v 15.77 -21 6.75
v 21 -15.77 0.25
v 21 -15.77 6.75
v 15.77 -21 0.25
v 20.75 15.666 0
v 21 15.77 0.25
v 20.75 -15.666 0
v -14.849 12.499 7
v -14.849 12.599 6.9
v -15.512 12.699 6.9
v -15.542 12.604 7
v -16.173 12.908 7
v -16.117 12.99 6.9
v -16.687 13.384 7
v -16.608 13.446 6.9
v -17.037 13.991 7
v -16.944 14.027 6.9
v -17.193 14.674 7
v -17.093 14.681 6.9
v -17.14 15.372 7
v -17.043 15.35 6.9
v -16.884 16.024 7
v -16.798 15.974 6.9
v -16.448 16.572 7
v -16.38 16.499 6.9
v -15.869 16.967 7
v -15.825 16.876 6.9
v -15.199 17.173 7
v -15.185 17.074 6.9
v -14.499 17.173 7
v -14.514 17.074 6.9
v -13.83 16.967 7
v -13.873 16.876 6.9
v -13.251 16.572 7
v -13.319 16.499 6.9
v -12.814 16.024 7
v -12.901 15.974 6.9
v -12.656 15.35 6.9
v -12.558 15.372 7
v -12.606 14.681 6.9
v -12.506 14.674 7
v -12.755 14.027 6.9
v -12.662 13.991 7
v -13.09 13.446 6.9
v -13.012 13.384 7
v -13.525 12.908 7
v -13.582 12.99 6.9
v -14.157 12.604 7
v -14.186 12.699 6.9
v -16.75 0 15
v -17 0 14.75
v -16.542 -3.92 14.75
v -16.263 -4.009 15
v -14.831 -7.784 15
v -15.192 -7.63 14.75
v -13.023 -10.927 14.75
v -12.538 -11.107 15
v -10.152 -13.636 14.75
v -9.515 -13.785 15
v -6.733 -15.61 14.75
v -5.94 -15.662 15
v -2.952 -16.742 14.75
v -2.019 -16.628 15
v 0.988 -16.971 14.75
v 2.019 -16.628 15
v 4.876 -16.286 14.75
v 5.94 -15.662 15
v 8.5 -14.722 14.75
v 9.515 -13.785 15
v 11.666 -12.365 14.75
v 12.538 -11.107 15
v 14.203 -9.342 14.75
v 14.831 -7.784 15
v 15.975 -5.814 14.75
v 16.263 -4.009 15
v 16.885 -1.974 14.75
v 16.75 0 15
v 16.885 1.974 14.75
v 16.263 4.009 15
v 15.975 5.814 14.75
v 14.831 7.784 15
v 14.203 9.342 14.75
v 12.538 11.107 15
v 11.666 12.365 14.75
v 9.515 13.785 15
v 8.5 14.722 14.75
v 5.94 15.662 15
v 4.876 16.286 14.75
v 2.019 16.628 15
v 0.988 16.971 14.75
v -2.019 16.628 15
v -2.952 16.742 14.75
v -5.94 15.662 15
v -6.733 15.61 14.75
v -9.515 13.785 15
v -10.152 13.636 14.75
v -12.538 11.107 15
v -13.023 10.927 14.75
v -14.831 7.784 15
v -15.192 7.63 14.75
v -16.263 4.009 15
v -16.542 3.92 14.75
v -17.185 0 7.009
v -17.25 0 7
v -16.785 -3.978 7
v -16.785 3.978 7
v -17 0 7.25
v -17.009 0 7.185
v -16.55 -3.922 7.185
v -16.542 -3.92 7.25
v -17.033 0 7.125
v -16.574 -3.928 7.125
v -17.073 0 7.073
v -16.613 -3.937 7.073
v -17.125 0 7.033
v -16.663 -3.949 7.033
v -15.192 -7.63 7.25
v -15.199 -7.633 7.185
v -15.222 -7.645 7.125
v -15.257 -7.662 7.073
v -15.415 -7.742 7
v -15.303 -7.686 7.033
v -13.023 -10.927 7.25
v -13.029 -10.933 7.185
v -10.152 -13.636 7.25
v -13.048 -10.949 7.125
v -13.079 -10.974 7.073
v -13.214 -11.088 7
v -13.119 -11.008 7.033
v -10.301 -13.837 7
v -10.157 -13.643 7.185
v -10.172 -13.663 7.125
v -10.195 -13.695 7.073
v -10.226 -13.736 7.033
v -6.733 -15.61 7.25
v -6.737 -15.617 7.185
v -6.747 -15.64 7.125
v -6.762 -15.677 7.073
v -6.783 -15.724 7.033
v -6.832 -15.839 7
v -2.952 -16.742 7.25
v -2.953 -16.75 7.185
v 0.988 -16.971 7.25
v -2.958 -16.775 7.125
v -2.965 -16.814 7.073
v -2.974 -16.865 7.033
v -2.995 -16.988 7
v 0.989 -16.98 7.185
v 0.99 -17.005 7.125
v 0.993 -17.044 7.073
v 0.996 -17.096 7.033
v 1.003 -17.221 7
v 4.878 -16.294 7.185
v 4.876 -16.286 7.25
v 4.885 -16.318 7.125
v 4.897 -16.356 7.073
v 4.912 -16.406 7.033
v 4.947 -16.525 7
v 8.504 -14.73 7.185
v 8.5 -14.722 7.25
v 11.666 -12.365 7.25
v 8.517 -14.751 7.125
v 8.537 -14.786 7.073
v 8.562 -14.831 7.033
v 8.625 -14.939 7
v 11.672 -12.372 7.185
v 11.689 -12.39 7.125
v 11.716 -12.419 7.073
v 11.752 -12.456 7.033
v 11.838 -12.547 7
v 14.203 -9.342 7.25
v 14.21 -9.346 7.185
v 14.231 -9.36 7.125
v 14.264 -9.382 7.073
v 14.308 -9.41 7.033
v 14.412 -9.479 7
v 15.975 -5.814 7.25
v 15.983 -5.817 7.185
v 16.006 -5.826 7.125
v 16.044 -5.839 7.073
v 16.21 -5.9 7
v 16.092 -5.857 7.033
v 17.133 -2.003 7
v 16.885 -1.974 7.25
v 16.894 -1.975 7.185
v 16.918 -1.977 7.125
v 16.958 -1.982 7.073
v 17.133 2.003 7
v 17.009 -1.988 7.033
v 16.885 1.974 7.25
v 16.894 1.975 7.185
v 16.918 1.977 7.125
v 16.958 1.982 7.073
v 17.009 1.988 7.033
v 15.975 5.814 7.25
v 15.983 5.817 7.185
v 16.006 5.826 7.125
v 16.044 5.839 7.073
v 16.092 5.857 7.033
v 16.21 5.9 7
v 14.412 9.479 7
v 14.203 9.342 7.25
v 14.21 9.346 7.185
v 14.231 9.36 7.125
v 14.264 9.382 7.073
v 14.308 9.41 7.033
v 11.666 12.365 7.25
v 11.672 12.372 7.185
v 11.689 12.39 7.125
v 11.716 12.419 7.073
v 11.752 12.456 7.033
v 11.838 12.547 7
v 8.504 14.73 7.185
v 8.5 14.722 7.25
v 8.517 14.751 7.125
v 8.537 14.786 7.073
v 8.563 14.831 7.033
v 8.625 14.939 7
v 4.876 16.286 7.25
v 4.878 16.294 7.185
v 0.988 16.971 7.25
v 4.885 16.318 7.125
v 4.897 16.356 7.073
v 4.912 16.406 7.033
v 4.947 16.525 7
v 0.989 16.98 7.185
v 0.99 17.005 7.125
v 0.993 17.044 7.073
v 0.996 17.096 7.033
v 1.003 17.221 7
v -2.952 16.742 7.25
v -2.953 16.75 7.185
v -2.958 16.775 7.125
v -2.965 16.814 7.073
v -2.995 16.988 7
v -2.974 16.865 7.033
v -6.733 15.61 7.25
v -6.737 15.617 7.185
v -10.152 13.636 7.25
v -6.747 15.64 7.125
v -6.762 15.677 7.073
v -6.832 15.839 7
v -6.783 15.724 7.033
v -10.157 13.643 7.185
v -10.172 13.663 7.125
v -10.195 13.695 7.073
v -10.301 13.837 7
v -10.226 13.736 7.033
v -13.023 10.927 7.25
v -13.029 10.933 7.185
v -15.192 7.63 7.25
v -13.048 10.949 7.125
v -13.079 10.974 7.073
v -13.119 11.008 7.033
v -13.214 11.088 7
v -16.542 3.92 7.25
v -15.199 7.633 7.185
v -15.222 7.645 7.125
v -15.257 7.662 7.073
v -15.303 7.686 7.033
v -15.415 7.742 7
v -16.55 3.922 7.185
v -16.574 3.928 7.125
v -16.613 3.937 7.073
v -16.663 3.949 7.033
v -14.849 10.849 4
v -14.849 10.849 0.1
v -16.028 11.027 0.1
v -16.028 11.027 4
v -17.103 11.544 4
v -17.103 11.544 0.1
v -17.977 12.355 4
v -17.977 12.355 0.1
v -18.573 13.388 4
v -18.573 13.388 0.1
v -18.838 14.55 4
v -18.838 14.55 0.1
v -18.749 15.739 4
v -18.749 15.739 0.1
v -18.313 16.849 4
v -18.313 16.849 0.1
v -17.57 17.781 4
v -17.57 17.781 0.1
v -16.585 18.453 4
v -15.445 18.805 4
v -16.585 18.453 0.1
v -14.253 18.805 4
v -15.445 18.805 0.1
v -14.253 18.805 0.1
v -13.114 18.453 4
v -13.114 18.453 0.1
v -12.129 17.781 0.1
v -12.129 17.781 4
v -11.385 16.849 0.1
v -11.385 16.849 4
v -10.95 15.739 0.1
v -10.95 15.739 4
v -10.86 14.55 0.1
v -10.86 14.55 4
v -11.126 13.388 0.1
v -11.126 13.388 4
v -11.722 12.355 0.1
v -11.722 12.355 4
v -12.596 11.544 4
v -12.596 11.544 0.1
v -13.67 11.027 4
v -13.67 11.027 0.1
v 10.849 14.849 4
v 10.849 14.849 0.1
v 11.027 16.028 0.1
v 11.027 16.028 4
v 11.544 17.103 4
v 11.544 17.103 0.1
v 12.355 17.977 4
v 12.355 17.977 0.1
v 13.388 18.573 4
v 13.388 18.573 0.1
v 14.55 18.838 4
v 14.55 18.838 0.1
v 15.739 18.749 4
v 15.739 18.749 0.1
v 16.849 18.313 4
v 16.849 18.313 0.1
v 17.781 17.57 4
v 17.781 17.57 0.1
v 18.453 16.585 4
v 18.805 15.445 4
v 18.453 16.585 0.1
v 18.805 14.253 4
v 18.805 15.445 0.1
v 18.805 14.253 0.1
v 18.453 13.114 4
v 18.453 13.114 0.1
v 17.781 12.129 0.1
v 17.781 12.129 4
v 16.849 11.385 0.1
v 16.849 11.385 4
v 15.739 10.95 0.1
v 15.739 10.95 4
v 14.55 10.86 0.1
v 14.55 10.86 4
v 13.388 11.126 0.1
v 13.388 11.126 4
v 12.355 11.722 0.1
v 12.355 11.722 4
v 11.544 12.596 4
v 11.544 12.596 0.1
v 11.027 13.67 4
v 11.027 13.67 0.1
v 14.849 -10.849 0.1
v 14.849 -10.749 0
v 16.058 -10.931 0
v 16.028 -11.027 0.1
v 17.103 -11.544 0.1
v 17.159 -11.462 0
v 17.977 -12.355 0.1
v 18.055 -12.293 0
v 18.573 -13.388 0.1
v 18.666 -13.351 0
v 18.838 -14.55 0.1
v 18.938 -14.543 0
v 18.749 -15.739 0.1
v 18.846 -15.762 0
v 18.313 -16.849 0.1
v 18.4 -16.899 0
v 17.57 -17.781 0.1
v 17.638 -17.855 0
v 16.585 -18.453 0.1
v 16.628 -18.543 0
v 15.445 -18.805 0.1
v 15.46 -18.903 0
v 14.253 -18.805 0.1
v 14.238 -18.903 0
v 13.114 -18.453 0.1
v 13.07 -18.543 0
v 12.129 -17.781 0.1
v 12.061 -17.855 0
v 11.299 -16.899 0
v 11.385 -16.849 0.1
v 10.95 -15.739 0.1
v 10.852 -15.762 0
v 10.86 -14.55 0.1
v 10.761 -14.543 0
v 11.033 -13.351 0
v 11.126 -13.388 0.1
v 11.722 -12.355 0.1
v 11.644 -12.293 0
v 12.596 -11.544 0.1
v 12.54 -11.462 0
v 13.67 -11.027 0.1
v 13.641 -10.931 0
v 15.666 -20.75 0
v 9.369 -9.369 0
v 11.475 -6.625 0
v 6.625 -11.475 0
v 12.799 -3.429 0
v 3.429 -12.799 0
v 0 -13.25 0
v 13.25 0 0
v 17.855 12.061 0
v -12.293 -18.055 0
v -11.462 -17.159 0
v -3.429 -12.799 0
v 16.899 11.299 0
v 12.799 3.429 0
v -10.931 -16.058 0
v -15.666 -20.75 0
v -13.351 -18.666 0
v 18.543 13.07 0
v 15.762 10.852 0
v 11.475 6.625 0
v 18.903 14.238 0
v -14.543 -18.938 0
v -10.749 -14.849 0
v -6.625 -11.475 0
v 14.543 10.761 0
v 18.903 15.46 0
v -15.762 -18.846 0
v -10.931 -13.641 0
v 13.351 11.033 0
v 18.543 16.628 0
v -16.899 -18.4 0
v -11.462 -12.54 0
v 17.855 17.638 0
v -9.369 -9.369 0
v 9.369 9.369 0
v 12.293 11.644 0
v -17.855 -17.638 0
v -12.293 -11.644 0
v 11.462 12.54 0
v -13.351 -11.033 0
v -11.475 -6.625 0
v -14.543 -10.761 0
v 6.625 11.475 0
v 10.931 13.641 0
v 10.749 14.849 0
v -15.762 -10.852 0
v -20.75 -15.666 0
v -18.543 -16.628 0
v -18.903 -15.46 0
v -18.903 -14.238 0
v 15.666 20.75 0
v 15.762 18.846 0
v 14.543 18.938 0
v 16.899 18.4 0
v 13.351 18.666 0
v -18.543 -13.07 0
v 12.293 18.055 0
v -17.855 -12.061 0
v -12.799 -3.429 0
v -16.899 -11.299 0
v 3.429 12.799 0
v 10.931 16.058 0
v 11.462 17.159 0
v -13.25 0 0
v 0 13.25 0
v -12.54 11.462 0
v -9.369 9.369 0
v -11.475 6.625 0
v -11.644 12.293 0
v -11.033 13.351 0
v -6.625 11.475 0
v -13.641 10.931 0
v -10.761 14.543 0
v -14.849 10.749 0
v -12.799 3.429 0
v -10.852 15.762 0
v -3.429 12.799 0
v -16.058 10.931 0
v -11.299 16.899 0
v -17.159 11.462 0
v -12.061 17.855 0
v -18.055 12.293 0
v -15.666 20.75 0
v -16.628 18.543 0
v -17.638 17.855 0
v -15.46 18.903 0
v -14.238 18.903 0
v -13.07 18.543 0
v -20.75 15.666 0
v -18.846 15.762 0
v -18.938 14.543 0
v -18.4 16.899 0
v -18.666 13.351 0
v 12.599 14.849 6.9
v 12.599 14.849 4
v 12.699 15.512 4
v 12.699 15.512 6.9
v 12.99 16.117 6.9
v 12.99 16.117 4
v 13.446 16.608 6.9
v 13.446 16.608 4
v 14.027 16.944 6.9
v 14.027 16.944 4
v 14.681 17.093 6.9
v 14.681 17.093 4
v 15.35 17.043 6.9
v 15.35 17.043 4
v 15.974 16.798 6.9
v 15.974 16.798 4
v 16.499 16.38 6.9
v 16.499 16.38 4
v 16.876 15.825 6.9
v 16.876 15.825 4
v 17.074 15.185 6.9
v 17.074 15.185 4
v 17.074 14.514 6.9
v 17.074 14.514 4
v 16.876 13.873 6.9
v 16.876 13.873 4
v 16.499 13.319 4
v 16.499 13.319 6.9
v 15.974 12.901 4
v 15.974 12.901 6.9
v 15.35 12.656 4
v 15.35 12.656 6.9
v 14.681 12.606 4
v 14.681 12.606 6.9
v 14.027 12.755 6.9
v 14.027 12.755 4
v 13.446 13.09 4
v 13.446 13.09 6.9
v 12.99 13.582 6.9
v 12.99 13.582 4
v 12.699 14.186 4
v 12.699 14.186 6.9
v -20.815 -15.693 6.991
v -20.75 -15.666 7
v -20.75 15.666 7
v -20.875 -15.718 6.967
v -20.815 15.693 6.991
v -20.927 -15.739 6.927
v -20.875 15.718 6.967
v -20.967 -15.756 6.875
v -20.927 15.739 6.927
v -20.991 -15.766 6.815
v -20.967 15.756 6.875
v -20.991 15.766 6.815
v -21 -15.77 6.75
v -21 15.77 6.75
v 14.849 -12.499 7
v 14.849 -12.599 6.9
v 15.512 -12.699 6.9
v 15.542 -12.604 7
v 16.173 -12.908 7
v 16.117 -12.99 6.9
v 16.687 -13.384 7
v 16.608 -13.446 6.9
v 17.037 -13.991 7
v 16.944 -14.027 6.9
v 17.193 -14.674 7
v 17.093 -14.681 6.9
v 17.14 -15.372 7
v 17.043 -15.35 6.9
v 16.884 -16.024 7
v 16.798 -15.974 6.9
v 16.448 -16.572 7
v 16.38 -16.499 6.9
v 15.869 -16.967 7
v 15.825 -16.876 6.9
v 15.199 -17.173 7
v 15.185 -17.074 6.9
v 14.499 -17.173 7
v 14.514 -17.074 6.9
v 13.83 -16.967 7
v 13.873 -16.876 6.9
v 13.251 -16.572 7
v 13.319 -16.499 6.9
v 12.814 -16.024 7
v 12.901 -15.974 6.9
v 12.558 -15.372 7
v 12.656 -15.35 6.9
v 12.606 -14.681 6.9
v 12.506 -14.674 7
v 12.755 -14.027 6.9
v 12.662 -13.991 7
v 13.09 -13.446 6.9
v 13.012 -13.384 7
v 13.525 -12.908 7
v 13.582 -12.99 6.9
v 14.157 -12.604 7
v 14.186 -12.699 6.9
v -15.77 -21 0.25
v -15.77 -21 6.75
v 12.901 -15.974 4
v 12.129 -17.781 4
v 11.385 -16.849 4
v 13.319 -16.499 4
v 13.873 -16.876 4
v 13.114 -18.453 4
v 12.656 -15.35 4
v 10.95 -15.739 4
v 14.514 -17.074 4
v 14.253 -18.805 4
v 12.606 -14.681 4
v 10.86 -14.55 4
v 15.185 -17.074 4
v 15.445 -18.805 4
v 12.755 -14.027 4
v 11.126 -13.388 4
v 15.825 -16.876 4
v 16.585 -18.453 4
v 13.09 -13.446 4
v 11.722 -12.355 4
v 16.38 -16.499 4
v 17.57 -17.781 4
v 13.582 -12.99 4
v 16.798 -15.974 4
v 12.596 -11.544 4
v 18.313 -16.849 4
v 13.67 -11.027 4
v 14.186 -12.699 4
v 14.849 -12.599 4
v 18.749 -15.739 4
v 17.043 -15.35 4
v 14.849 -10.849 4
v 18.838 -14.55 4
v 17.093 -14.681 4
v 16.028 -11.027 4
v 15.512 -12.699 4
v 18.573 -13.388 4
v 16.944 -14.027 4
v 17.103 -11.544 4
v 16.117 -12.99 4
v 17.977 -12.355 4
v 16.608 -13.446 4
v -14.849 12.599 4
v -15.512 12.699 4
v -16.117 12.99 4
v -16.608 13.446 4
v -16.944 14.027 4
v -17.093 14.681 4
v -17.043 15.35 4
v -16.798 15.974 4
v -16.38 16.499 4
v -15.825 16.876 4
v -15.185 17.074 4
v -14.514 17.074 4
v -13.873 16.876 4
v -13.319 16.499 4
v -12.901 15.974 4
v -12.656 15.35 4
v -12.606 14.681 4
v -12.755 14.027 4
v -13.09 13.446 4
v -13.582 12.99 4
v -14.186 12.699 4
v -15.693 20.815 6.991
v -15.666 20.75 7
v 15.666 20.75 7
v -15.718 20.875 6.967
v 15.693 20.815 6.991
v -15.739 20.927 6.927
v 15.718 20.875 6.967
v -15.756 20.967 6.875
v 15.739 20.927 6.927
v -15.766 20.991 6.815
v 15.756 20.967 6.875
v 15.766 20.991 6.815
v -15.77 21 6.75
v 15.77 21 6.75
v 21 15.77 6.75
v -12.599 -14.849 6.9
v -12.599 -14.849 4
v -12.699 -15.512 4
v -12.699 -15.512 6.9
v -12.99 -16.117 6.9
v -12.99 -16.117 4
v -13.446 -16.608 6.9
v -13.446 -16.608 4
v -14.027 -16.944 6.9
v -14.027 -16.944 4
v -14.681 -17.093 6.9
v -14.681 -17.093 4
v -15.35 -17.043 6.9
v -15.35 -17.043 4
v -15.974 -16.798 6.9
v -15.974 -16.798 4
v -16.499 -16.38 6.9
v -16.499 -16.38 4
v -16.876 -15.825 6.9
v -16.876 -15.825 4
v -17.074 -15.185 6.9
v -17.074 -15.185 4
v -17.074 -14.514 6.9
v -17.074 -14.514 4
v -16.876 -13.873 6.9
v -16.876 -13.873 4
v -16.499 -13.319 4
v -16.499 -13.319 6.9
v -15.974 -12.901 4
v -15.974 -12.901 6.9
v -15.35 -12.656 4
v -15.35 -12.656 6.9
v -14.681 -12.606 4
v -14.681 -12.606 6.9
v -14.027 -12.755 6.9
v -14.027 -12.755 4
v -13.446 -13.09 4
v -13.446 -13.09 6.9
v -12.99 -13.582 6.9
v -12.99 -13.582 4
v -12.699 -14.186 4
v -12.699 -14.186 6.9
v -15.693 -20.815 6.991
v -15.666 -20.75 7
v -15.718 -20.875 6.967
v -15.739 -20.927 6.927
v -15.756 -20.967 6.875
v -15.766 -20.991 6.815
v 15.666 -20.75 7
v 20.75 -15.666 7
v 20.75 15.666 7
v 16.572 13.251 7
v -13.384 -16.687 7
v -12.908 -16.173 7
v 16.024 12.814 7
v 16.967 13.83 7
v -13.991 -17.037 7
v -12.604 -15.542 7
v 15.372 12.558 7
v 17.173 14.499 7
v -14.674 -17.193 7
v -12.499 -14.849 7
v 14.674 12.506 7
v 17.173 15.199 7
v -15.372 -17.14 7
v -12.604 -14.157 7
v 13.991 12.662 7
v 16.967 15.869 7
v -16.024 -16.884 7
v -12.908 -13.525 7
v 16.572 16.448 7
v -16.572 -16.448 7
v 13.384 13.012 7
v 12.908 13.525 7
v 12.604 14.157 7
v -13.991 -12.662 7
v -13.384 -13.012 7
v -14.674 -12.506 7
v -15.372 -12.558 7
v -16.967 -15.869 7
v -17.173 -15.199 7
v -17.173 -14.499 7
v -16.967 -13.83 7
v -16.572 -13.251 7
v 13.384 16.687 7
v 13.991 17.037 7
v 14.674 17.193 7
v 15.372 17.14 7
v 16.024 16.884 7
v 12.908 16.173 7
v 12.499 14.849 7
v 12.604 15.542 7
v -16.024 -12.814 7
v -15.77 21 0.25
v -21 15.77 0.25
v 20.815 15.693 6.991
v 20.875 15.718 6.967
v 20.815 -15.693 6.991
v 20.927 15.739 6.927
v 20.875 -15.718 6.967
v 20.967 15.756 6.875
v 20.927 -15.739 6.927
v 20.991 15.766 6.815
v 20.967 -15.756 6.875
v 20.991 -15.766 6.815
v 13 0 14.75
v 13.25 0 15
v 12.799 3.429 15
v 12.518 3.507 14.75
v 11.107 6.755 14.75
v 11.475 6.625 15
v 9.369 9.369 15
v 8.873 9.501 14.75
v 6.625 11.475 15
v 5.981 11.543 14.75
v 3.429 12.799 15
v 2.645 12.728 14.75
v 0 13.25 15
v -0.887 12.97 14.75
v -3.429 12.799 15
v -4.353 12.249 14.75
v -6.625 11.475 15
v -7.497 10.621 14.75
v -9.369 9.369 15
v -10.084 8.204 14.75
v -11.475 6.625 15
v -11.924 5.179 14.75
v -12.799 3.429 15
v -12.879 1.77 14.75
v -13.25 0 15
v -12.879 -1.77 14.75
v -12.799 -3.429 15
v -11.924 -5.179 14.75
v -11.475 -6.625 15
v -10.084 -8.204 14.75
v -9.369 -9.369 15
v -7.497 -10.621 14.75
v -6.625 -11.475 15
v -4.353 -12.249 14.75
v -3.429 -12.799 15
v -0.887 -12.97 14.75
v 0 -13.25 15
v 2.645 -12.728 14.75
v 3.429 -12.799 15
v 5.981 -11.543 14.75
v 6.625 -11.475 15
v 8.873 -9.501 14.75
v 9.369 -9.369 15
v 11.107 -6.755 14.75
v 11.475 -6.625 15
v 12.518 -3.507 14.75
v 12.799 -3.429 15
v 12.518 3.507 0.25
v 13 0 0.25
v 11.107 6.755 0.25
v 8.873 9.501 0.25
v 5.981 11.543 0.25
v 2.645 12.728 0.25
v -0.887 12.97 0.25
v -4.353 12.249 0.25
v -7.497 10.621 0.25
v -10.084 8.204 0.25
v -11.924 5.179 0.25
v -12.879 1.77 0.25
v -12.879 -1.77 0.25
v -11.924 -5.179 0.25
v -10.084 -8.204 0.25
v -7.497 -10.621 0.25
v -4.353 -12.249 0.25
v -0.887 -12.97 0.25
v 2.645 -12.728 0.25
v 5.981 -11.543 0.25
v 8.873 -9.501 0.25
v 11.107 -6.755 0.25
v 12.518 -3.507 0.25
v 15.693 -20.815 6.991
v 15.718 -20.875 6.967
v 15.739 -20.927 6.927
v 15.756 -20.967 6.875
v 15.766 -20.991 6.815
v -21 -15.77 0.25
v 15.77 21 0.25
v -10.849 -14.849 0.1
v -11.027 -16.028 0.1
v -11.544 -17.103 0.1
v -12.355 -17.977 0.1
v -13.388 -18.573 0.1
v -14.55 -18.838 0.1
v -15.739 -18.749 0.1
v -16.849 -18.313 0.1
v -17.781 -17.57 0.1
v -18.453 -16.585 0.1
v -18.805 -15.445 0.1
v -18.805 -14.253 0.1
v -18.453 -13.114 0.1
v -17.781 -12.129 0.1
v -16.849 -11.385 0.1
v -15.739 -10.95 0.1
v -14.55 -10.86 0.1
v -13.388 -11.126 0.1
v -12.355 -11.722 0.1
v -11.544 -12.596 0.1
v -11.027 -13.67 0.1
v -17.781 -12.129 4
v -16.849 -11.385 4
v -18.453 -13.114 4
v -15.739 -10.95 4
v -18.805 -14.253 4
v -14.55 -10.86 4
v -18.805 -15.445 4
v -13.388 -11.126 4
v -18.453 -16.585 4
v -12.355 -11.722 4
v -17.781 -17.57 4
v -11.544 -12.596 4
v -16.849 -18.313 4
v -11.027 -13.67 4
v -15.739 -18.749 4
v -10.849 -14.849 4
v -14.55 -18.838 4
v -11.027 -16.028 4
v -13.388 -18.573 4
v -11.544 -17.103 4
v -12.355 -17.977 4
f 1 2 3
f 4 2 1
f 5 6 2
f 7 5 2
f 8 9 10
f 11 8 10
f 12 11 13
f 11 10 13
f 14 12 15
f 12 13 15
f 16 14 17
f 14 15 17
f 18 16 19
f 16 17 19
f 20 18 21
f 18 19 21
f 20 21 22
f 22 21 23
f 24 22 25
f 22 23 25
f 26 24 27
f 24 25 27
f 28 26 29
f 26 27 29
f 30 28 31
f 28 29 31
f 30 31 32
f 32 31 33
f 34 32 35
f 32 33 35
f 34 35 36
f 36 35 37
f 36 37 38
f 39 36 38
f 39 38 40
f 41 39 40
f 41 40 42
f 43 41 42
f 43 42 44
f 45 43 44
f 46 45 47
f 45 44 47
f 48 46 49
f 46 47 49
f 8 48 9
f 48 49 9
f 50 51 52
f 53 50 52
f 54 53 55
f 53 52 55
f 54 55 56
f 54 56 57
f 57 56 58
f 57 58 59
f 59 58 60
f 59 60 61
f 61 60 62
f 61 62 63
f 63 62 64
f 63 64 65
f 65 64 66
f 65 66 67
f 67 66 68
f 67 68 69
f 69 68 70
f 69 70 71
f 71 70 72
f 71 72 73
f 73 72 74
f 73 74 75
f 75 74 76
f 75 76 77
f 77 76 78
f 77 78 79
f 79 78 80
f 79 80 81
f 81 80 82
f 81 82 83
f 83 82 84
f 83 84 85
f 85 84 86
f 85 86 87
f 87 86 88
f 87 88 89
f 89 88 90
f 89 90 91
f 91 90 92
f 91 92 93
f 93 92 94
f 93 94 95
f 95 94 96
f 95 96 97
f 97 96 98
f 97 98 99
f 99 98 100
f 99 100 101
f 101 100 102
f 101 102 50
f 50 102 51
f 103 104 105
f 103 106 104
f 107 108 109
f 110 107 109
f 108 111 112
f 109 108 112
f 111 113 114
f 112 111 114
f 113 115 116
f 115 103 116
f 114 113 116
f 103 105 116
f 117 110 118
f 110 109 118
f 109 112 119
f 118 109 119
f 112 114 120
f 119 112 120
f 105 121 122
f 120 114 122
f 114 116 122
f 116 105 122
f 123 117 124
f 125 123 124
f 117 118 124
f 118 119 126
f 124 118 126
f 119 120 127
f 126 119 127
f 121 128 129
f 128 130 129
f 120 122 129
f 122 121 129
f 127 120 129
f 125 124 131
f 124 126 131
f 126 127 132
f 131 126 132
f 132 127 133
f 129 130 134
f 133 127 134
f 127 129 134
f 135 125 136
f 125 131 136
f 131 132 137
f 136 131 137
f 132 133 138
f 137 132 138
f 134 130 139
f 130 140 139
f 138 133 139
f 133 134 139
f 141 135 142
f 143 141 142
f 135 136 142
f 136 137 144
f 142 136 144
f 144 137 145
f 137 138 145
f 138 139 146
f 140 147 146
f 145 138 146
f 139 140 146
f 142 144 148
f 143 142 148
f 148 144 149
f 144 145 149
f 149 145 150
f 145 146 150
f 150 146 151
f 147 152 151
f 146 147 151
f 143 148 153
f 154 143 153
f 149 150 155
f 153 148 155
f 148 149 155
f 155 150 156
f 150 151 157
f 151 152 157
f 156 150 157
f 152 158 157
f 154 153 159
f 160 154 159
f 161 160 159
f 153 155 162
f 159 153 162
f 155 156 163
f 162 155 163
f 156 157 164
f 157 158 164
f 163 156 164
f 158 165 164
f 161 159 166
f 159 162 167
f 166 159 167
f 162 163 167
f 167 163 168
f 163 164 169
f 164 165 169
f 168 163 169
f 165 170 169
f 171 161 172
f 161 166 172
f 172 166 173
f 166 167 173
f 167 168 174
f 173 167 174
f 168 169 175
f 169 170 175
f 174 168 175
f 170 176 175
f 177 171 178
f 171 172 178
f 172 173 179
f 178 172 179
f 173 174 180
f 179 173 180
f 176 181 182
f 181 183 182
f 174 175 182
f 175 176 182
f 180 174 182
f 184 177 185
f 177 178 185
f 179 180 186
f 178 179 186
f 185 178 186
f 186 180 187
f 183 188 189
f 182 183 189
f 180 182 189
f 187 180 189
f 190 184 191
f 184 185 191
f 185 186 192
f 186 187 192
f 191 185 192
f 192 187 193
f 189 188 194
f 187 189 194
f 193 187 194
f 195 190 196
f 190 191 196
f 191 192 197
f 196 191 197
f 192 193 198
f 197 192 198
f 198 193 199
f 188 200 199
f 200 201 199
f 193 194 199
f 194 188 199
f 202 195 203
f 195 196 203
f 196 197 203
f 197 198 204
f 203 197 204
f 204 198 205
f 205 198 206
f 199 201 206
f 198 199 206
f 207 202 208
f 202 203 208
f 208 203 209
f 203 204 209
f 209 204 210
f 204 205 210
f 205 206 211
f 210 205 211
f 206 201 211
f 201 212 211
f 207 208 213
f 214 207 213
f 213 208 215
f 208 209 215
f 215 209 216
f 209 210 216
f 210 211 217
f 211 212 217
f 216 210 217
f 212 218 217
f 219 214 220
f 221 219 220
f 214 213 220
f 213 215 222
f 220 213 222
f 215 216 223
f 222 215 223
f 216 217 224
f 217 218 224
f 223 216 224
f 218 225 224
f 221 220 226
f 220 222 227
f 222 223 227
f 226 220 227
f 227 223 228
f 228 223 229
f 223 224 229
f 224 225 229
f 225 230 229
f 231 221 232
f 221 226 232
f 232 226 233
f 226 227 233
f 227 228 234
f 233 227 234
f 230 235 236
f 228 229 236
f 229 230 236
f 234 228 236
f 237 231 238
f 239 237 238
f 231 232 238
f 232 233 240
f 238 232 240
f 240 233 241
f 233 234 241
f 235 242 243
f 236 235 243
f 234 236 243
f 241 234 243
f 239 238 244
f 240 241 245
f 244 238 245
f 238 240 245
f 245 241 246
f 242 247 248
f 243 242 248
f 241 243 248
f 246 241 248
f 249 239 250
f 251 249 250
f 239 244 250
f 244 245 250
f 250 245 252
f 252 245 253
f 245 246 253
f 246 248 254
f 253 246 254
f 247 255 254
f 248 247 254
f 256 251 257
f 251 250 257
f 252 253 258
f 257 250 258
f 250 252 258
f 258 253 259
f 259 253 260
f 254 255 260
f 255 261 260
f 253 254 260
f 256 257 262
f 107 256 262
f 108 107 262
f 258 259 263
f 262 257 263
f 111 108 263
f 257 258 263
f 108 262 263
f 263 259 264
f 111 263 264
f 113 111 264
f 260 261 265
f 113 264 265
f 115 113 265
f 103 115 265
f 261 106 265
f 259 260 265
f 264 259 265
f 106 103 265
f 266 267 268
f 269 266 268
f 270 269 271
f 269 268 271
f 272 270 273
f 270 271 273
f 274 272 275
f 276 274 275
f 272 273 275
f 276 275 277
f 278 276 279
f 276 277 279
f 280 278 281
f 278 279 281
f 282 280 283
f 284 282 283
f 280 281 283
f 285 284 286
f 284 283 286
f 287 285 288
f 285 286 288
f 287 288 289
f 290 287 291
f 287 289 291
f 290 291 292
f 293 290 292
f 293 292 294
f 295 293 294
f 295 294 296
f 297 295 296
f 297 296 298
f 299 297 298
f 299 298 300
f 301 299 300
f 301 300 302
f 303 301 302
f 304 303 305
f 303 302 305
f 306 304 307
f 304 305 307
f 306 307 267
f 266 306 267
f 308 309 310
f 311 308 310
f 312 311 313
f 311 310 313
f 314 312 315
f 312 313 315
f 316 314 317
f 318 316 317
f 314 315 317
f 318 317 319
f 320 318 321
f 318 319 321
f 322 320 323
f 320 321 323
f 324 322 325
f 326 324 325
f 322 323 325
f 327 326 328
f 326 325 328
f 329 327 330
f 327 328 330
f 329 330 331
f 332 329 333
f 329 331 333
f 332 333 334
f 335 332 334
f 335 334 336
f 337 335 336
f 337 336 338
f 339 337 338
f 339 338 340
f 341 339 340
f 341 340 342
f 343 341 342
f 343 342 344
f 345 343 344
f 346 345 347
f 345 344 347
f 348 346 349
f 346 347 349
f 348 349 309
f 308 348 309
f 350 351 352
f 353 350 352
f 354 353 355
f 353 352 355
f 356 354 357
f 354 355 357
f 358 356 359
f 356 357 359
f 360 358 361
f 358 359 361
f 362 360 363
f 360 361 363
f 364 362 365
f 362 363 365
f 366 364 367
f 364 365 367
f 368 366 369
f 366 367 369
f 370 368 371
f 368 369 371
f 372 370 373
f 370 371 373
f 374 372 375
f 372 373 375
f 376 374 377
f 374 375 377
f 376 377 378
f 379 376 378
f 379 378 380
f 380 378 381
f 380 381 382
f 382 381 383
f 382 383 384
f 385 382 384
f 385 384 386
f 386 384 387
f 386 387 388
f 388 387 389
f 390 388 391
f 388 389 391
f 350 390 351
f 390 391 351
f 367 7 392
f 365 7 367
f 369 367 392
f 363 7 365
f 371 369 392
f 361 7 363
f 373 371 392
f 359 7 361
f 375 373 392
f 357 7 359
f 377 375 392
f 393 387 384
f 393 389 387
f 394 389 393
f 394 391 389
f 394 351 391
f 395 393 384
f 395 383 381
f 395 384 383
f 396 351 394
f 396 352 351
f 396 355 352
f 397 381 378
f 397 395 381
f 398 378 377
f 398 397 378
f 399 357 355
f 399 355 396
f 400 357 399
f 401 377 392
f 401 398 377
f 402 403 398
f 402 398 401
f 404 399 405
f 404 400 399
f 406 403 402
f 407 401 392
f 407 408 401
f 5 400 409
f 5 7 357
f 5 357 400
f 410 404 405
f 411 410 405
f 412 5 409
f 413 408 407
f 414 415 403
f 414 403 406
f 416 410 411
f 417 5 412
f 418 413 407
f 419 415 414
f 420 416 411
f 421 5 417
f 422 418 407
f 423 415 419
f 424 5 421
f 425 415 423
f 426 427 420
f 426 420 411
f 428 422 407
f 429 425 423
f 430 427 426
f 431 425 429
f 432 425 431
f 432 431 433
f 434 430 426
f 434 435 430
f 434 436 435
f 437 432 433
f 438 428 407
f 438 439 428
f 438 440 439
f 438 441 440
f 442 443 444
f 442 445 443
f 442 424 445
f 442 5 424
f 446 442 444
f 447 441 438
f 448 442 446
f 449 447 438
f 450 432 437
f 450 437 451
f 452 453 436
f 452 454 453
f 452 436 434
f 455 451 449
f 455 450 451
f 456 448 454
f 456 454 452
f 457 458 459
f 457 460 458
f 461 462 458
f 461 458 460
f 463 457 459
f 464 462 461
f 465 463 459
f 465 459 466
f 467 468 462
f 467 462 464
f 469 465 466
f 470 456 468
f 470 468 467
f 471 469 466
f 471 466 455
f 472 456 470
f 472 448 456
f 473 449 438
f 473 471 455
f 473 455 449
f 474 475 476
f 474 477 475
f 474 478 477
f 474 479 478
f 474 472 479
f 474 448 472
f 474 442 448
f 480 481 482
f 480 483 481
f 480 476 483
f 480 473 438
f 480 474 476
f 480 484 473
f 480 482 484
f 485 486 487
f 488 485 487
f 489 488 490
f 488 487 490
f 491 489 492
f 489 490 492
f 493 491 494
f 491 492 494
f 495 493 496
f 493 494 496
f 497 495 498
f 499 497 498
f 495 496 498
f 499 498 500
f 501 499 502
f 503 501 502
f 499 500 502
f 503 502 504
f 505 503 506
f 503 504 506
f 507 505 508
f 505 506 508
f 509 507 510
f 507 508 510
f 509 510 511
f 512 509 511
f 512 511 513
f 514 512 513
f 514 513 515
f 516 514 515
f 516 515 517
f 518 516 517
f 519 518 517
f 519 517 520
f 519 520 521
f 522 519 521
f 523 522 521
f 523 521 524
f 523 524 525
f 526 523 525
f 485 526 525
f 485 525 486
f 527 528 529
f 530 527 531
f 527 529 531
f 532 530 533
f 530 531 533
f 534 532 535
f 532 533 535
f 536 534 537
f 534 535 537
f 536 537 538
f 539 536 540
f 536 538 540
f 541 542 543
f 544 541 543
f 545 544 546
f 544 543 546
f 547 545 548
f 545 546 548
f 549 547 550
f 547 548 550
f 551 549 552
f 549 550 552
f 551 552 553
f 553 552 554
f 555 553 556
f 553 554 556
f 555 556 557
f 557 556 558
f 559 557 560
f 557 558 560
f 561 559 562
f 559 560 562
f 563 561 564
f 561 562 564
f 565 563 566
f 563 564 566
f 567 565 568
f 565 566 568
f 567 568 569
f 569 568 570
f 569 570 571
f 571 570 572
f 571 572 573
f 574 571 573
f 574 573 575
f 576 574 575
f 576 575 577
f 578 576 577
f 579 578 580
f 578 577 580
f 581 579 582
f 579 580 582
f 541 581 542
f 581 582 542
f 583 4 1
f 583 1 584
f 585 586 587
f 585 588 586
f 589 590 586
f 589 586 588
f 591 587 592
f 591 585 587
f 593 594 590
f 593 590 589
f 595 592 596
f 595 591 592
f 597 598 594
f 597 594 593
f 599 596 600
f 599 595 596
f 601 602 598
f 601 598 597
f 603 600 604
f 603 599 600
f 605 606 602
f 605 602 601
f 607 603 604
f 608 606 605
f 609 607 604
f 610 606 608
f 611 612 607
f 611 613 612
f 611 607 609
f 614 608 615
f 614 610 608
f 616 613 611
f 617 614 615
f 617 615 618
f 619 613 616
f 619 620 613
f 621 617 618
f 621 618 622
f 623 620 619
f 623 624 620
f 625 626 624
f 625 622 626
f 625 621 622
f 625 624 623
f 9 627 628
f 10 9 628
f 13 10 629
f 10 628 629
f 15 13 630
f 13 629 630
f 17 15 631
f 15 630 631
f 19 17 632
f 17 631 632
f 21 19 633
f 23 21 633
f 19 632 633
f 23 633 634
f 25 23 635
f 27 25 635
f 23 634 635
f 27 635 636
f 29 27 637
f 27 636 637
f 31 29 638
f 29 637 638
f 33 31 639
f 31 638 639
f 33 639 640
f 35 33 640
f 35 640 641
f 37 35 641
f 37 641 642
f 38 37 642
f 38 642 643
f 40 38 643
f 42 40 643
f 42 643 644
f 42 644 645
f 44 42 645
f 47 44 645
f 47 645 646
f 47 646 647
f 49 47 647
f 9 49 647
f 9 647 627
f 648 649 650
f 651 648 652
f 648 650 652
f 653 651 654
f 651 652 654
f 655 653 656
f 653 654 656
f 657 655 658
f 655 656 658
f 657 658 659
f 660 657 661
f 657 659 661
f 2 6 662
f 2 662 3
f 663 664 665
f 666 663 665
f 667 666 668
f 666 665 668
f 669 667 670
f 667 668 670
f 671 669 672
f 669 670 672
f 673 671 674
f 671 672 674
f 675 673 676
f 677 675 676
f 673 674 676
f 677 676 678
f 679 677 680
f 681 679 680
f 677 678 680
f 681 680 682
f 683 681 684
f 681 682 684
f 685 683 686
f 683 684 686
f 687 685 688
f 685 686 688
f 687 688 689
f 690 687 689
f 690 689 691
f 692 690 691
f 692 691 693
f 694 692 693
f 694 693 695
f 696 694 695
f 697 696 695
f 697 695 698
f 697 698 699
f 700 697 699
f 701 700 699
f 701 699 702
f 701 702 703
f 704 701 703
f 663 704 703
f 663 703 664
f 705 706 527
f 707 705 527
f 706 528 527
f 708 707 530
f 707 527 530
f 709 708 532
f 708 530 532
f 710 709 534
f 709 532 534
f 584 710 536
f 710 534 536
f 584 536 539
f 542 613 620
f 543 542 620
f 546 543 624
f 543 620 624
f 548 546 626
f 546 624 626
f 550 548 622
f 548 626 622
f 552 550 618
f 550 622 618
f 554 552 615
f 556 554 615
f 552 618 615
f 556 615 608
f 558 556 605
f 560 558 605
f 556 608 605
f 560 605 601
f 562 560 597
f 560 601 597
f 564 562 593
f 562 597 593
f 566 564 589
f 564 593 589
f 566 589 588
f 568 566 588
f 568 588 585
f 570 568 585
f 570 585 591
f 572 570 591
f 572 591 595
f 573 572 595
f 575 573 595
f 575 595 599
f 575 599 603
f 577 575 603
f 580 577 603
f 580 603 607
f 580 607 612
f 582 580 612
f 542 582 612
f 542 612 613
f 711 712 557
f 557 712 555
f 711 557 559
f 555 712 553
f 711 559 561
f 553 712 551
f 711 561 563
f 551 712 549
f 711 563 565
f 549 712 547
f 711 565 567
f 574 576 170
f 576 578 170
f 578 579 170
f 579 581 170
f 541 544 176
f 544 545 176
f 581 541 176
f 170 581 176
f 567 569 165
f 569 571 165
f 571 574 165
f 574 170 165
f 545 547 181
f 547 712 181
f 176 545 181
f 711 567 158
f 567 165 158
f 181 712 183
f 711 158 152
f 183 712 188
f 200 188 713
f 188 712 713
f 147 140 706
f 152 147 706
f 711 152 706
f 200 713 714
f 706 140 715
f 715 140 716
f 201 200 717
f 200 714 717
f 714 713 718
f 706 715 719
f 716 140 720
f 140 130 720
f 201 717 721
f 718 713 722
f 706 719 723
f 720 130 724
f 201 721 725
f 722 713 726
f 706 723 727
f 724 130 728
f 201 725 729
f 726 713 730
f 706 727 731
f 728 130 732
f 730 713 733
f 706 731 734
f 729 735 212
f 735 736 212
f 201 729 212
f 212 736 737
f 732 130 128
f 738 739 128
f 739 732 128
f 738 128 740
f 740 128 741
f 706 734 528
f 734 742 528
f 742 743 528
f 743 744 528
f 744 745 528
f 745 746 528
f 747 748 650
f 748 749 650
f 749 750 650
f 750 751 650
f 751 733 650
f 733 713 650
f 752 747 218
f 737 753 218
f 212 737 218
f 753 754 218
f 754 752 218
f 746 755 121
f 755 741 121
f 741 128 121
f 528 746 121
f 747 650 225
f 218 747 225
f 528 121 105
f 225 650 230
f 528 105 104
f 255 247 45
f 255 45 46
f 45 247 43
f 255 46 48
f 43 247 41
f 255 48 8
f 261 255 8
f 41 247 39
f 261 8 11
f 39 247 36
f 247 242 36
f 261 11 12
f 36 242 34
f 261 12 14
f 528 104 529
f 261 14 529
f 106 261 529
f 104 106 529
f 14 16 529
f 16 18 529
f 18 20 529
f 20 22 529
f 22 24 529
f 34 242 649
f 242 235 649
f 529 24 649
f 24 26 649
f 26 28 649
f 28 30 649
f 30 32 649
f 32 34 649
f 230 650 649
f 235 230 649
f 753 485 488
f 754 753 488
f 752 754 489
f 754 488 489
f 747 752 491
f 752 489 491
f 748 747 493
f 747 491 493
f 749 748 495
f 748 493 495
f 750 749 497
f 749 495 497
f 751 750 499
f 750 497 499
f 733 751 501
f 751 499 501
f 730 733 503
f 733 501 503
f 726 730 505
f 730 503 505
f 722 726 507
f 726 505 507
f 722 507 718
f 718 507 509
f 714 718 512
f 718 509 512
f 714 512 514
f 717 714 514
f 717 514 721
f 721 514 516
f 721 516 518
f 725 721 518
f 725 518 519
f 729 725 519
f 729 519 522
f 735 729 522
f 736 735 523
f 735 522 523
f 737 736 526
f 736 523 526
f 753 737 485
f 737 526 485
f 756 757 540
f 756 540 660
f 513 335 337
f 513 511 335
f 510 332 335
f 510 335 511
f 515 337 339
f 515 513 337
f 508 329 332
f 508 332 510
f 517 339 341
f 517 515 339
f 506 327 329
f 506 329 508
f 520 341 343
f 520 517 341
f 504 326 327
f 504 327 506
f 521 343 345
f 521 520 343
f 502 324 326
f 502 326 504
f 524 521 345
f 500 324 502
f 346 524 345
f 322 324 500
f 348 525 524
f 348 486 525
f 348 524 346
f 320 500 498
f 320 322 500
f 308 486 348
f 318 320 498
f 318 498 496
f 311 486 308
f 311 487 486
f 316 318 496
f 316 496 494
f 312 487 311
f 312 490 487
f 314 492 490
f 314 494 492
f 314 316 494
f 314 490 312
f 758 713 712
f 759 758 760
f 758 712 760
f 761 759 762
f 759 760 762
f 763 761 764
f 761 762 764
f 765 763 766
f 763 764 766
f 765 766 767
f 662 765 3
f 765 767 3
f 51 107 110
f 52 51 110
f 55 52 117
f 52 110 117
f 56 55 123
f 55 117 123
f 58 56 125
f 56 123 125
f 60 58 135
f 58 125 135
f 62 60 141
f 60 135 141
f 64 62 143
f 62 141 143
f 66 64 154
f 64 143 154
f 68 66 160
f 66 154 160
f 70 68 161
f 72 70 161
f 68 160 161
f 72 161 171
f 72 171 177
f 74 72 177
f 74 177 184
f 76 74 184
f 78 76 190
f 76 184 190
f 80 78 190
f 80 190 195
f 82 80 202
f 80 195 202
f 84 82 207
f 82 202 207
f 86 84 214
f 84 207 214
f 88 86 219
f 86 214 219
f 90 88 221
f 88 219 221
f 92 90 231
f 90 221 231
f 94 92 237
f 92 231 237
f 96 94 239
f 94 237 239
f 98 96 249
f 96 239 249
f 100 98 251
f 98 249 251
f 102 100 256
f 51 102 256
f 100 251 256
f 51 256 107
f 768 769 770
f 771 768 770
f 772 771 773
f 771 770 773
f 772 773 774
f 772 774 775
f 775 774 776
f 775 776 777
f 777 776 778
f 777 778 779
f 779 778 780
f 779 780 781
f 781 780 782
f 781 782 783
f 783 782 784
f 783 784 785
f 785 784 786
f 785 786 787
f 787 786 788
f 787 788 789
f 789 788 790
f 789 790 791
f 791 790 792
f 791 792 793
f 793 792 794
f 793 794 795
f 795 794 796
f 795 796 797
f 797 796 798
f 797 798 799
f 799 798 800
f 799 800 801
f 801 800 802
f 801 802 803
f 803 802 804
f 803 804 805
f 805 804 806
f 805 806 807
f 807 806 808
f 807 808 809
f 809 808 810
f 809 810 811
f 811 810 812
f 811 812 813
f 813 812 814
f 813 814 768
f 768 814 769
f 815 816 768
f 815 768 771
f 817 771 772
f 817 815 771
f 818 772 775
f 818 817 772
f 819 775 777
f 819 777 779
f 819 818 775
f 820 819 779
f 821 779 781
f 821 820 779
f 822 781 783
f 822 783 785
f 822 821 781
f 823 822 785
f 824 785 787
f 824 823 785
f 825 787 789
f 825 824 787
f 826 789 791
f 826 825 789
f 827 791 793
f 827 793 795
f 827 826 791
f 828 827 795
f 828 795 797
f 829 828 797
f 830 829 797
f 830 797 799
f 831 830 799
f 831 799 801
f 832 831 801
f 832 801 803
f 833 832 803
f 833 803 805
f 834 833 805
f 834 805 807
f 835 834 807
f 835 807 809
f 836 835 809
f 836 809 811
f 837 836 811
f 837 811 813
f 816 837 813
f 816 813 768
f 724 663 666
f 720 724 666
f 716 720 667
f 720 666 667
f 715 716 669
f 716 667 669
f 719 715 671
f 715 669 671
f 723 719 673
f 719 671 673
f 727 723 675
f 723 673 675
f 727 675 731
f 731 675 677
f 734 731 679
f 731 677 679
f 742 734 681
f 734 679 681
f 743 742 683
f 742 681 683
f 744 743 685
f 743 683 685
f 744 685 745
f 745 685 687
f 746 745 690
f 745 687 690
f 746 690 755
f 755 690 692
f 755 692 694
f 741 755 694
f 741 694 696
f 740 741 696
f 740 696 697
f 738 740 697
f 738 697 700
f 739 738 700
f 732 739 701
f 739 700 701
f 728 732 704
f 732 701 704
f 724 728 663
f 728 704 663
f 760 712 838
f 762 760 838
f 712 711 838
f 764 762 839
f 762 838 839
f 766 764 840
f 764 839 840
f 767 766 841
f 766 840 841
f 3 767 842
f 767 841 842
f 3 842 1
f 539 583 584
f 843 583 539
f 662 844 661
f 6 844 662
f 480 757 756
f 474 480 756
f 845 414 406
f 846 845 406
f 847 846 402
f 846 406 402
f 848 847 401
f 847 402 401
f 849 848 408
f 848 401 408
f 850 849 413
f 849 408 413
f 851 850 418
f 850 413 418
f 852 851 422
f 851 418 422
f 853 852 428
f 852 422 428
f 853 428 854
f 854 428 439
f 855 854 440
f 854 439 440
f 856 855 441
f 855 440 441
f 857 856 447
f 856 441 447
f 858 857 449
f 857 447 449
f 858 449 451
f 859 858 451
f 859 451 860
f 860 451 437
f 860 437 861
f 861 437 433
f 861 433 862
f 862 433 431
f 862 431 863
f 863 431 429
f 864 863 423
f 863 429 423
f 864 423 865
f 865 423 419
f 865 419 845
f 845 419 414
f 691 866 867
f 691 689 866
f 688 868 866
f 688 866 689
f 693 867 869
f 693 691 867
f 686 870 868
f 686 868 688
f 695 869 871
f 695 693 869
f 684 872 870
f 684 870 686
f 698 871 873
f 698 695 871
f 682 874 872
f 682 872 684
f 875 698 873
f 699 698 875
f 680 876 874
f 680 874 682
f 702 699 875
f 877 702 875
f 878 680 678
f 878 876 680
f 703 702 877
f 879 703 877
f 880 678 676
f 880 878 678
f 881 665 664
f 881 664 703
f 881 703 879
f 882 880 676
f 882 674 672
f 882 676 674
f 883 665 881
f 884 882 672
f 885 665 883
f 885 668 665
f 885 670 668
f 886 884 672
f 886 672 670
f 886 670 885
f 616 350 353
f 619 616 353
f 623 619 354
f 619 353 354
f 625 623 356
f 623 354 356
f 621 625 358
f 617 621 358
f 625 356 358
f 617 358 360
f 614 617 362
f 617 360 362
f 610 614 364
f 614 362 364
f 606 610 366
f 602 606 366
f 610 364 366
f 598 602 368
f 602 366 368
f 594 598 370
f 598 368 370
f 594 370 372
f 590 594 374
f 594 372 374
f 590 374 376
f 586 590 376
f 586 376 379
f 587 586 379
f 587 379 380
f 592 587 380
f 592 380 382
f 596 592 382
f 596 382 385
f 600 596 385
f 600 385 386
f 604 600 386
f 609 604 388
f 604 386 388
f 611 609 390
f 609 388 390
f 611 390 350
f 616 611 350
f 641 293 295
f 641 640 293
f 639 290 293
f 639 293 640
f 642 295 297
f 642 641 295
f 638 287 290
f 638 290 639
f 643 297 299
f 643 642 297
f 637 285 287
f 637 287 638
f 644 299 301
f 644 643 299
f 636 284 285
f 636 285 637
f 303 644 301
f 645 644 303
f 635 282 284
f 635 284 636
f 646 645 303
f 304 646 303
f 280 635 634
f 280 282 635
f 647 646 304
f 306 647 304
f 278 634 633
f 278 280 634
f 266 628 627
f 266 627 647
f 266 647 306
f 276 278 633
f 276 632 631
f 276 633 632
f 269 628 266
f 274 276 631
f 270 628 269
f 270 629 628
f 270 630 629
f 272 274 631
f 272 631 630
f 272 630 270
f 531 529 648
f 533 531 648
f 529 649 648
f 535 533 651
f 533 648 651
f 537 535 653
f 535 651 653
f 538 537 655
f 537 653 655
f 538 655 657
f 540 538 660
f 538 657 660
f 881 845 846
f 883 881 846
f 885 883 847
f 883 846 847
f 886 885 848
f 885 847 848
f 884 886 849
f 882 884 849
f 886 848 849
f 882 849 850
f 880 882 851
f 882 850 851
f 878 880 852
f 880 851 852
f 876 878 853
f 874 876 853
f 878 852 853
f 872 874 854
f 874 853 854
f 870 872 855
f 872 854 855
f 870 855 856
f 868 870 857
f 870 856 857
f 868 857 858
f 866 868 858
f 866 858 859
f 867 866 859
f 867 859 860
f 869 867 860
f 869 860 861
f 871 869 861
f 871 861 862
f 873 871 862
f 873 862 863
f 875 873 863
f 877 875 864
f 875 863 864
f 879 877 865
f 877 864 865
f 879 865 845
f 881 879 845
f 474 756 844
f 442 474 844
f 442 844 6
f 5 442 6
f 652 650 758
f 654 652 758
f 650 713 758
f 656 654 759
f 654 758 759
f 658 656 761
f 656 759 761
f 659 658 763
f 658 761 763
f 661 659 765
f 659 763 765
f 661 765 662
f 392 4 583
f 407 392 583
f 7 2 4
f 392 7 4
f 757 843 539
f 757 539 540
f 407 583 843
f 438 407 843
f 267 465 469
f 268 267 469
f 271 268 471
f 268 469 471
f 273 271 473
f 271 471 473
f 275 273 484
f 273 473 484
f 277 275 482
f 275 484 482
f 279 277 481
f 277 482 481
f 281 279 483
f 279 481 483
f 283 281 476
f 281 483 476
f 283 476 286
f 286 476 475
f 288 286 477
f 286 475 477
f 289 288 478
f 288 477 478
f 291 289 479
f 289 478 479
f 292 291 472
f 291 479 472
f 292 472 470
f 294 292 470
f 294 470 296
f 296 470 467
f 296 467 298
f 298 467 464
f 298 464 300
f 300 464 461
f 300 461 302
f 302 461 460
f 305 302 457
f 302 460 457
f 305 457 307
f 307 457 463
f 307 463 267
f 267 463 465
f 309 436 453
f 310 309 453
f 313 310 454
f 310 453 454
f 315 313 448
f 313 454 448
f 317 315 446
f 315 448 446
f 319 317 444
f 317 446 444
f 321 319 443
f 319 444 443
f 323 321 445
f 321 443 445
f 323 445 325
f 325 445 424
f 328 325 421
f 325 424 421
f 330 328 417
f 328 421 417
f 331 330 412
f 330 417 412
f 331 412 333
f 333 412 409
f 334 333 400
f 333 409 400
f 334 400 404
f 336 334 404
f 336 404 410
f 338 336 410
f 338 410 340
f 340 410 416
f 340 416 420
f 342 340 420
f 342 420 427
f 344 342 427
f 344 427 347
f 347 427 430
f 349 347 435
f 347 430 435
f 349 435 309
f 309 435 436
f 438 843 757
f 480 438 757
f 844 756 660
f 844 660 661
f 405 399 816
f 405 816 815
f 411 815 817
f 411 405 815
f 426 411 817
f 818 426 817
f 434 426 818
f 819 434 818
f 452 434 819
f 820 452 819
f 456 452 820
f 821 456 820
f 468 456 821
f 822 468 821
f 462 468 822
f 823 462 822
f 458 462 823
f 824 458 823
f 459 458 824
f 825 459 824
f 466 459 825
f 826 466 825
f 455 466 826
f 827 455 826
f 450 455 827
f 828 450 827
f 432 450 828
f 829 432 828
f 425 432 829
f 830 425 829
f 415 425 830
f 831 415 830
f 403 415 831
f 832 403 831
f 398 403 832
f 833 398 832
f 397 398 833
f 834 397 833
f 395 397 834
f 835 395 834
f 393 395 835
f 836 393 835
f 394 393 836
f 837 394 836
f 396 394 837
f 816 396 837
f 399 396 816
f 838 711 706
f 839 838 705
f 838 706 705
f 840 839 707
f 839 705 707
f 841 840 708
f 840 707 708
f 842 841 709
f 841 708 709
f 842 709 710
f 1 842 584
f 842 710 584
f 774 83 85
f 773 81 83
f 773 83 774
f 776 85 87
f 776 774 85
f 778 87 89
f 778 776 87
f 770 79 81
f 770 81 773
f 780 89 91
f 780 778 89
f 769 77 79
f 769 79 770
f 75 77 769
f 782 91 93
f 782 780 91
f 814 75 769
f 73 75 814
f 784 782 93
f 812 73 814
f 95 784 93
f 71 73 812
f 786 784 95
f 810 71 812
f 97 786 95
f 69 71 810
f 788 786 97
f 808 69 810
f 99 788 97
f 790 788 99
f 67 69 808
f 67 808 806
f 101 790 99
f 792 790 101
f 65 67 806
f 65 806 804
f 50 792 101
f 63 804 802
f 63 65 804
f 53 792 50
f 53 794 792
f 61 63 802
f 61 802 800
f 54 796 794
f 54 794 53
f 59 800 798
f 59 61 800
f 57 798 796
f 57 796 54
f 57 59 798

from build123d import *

# Parameters (mm, degrees)
SCHIZZO1_R                   = 13
ESTRUSIONE_ESTRUSIONE1_DEPTH = 7
SCHIZZO2_R                   = 17
SCHIZZO2_R_2                 = 13
ESTRUSIONE_ESTRUSIONE2_DEPTH = 8
SMUSSO1_SIZE                 = 0.25
SMUSSO2_SIZE                 = 0.25
RACCORDO1_R                  = 0.25
RACCORDO2_R                  = 0.25
SCHIZZO3_R                   = 2.25
TAGLIO_ESTRUSIONE1_DEPTH     = 34.271609519
SCHIZZO4_R                   = 4
TAGLIO_ESTRUSIONE2_DEPTH     = 4
RIPETIZIONECIRCOLARE1_COUNT  = 4
SMUSSO3_SIZE                 = 0.1


with BuildPart() as part:
    # Schizzo1 → Estrusione-Estrusione1 (new body)
    with BuildSketch(Plane.XY):
        Polygon((-21, 15.769552622), (-15.769552622, 21), (15.769552622, 21), (21, 15.769552622), (21, -15.769552622), (15.769552622, -21), (-15.769552622, -21), (-21, -15.769552622), align=None)
        Circle(SCHIZZO1_R, mode=Mode.SUBTRACT)
    extrude(amount=ESTRUSIONE_ESTRUSIONE1_DEPTH)

    # Schizzo2 → Estrusione-Estrusione2 (add)
    with BuildSketch(Plane.XY.offset(7)):
        Circle(SCHIZZO2_R)
        Circle(SCHIZZO2_R_2, mode=Mode.SUBTRACT)
    extrude(amount=ESTRUSIONE_ESTRUSIONE2_DEPTH)

    # Smusso1
    smusso1_edges = [part.edges().sort_by_distance(p)[0] for p in [
        (-13, 0, 0),
        (0, 21, 0),
        (-18.384776311, 18.384776311, 0),
        (-21, 0, 0),
        (-18.384776311, -18.384776311, 0),
        (0, -21, 0),
        (18.384776311, -18.384776311, 0),
        (21, 0, 0),
        (18.384776311, 18.384776311, 0),
    ]]
    chamfer(smusso1_edges, length=SMUSSO1_SIZE)

    # Smusso2
    smusso2_edges = [part.edges().sort_by_distance(p)[0] for p in [
        (-13, 0, 15),
        (-17, 0, 15),
    ]]
    chamfer(smusso2_edges, length=SMUSSO2_SIZE)

    # Raccordo1
    raccordo1_edges = [part.edges().sort_by_distance(p)[0] for p in [
        (-17, 0, 7),
    ]]
    fillet(raccordo1_edges, radius=RACCORDO1_R)

    # Raccordo2
    raccordo2_edges = [part.edges().sort_by_distance(p)[0] for p in [
        (21, 0, 7),
        (18.384776311, -18.384776311, 7),
        (0, -21, 7),
        (-18.384776311, -18.384776311, 7),
        (-21, 0, 7),
        (-18.384776311, 18.384776311, 7),
        (0, 21, 7),
        (18.384776311, 18.384776311, 7),
    ]]
    fillet(raccordo2_edges, radius=RACCORDO2_R)

    # Schizzo3 → Taglio-Estrusione1 (cut, through all)
    with BuildSketch(Plane(origin=(0, 0, 0), x_dir=(-1, 0, 0), z_dir=(0, 0, -1))):
        with Locations((-14.849242405, 14.849242405)):
            Circle(SCHIZZO3_R)
    taglio_estrusione1 = extrude(amount=-TAGLIO_ESTRUSIONE1_DEPTH, mode=Mode.SUBTRACT)

    # Schizzo4 → Taglio-Estrusione2 (cut)
    with BuildSketch(Plane(origin=(0, 0, 0), x_dir=(-1, 0, 0), z_dir=(0, 0, -1))):
        with Locations((-14.849242405, 14.849242405)):
            Circle(SCHIZZO4_R)
    taglio_estrusione2 = extrude(amount=-TAGLIO_ESTRUSIONE2_DEPTH, mode=Mode.SUBTRACT)

    # RipetizioneCircolare1: Taglio-Estrusione1, Taglio-Estrusione2 ×4 about axis
    ripetizionecircolare1_axis = Axis((0, 0, 80.585678907), (0, 0, -1))
    add([taglio_estrusione1.rotate(ripetizionecircolare1_axis, i * 360 / RIPETIZIONECIRCOLARE1_COUNT) for i in range(1, RIPETIZIONECIRCOLARE1_COUNT)], mode=Mode.SUBTRACT)
    add([taglio_estrusione2.rotate(ripetizionecircolare1_axis, i * 360 / RIPETIZIONECIRCOLARE1_COUNT) for i in range(1, RIPETIZIONECIRCOLARE1_COUNT)], mode=Mode.SUBTRACT)

    # Smusso3
    smusso3_edges = [part.edges().sort_by_distance(p)[0] for p in [
        (14.849242405, -17.099242405, 7),
        (-17.099242405, -14.849242405, 7),
        (-14.849242405, 17.099242405, 7),
        (17.099242405, 14.849242405, 7),
        (18.849242405, 14.849242405, 0),
        (-14.849242405, 18.849242405, 0),
        (-18.849242405, -14.849242405, 0),
        (14.849242405, -18.849242405, 0),
    ]]
    chamfer(smusso3_edges, length=SMUSSO3_SIZE)


solid = part.part
